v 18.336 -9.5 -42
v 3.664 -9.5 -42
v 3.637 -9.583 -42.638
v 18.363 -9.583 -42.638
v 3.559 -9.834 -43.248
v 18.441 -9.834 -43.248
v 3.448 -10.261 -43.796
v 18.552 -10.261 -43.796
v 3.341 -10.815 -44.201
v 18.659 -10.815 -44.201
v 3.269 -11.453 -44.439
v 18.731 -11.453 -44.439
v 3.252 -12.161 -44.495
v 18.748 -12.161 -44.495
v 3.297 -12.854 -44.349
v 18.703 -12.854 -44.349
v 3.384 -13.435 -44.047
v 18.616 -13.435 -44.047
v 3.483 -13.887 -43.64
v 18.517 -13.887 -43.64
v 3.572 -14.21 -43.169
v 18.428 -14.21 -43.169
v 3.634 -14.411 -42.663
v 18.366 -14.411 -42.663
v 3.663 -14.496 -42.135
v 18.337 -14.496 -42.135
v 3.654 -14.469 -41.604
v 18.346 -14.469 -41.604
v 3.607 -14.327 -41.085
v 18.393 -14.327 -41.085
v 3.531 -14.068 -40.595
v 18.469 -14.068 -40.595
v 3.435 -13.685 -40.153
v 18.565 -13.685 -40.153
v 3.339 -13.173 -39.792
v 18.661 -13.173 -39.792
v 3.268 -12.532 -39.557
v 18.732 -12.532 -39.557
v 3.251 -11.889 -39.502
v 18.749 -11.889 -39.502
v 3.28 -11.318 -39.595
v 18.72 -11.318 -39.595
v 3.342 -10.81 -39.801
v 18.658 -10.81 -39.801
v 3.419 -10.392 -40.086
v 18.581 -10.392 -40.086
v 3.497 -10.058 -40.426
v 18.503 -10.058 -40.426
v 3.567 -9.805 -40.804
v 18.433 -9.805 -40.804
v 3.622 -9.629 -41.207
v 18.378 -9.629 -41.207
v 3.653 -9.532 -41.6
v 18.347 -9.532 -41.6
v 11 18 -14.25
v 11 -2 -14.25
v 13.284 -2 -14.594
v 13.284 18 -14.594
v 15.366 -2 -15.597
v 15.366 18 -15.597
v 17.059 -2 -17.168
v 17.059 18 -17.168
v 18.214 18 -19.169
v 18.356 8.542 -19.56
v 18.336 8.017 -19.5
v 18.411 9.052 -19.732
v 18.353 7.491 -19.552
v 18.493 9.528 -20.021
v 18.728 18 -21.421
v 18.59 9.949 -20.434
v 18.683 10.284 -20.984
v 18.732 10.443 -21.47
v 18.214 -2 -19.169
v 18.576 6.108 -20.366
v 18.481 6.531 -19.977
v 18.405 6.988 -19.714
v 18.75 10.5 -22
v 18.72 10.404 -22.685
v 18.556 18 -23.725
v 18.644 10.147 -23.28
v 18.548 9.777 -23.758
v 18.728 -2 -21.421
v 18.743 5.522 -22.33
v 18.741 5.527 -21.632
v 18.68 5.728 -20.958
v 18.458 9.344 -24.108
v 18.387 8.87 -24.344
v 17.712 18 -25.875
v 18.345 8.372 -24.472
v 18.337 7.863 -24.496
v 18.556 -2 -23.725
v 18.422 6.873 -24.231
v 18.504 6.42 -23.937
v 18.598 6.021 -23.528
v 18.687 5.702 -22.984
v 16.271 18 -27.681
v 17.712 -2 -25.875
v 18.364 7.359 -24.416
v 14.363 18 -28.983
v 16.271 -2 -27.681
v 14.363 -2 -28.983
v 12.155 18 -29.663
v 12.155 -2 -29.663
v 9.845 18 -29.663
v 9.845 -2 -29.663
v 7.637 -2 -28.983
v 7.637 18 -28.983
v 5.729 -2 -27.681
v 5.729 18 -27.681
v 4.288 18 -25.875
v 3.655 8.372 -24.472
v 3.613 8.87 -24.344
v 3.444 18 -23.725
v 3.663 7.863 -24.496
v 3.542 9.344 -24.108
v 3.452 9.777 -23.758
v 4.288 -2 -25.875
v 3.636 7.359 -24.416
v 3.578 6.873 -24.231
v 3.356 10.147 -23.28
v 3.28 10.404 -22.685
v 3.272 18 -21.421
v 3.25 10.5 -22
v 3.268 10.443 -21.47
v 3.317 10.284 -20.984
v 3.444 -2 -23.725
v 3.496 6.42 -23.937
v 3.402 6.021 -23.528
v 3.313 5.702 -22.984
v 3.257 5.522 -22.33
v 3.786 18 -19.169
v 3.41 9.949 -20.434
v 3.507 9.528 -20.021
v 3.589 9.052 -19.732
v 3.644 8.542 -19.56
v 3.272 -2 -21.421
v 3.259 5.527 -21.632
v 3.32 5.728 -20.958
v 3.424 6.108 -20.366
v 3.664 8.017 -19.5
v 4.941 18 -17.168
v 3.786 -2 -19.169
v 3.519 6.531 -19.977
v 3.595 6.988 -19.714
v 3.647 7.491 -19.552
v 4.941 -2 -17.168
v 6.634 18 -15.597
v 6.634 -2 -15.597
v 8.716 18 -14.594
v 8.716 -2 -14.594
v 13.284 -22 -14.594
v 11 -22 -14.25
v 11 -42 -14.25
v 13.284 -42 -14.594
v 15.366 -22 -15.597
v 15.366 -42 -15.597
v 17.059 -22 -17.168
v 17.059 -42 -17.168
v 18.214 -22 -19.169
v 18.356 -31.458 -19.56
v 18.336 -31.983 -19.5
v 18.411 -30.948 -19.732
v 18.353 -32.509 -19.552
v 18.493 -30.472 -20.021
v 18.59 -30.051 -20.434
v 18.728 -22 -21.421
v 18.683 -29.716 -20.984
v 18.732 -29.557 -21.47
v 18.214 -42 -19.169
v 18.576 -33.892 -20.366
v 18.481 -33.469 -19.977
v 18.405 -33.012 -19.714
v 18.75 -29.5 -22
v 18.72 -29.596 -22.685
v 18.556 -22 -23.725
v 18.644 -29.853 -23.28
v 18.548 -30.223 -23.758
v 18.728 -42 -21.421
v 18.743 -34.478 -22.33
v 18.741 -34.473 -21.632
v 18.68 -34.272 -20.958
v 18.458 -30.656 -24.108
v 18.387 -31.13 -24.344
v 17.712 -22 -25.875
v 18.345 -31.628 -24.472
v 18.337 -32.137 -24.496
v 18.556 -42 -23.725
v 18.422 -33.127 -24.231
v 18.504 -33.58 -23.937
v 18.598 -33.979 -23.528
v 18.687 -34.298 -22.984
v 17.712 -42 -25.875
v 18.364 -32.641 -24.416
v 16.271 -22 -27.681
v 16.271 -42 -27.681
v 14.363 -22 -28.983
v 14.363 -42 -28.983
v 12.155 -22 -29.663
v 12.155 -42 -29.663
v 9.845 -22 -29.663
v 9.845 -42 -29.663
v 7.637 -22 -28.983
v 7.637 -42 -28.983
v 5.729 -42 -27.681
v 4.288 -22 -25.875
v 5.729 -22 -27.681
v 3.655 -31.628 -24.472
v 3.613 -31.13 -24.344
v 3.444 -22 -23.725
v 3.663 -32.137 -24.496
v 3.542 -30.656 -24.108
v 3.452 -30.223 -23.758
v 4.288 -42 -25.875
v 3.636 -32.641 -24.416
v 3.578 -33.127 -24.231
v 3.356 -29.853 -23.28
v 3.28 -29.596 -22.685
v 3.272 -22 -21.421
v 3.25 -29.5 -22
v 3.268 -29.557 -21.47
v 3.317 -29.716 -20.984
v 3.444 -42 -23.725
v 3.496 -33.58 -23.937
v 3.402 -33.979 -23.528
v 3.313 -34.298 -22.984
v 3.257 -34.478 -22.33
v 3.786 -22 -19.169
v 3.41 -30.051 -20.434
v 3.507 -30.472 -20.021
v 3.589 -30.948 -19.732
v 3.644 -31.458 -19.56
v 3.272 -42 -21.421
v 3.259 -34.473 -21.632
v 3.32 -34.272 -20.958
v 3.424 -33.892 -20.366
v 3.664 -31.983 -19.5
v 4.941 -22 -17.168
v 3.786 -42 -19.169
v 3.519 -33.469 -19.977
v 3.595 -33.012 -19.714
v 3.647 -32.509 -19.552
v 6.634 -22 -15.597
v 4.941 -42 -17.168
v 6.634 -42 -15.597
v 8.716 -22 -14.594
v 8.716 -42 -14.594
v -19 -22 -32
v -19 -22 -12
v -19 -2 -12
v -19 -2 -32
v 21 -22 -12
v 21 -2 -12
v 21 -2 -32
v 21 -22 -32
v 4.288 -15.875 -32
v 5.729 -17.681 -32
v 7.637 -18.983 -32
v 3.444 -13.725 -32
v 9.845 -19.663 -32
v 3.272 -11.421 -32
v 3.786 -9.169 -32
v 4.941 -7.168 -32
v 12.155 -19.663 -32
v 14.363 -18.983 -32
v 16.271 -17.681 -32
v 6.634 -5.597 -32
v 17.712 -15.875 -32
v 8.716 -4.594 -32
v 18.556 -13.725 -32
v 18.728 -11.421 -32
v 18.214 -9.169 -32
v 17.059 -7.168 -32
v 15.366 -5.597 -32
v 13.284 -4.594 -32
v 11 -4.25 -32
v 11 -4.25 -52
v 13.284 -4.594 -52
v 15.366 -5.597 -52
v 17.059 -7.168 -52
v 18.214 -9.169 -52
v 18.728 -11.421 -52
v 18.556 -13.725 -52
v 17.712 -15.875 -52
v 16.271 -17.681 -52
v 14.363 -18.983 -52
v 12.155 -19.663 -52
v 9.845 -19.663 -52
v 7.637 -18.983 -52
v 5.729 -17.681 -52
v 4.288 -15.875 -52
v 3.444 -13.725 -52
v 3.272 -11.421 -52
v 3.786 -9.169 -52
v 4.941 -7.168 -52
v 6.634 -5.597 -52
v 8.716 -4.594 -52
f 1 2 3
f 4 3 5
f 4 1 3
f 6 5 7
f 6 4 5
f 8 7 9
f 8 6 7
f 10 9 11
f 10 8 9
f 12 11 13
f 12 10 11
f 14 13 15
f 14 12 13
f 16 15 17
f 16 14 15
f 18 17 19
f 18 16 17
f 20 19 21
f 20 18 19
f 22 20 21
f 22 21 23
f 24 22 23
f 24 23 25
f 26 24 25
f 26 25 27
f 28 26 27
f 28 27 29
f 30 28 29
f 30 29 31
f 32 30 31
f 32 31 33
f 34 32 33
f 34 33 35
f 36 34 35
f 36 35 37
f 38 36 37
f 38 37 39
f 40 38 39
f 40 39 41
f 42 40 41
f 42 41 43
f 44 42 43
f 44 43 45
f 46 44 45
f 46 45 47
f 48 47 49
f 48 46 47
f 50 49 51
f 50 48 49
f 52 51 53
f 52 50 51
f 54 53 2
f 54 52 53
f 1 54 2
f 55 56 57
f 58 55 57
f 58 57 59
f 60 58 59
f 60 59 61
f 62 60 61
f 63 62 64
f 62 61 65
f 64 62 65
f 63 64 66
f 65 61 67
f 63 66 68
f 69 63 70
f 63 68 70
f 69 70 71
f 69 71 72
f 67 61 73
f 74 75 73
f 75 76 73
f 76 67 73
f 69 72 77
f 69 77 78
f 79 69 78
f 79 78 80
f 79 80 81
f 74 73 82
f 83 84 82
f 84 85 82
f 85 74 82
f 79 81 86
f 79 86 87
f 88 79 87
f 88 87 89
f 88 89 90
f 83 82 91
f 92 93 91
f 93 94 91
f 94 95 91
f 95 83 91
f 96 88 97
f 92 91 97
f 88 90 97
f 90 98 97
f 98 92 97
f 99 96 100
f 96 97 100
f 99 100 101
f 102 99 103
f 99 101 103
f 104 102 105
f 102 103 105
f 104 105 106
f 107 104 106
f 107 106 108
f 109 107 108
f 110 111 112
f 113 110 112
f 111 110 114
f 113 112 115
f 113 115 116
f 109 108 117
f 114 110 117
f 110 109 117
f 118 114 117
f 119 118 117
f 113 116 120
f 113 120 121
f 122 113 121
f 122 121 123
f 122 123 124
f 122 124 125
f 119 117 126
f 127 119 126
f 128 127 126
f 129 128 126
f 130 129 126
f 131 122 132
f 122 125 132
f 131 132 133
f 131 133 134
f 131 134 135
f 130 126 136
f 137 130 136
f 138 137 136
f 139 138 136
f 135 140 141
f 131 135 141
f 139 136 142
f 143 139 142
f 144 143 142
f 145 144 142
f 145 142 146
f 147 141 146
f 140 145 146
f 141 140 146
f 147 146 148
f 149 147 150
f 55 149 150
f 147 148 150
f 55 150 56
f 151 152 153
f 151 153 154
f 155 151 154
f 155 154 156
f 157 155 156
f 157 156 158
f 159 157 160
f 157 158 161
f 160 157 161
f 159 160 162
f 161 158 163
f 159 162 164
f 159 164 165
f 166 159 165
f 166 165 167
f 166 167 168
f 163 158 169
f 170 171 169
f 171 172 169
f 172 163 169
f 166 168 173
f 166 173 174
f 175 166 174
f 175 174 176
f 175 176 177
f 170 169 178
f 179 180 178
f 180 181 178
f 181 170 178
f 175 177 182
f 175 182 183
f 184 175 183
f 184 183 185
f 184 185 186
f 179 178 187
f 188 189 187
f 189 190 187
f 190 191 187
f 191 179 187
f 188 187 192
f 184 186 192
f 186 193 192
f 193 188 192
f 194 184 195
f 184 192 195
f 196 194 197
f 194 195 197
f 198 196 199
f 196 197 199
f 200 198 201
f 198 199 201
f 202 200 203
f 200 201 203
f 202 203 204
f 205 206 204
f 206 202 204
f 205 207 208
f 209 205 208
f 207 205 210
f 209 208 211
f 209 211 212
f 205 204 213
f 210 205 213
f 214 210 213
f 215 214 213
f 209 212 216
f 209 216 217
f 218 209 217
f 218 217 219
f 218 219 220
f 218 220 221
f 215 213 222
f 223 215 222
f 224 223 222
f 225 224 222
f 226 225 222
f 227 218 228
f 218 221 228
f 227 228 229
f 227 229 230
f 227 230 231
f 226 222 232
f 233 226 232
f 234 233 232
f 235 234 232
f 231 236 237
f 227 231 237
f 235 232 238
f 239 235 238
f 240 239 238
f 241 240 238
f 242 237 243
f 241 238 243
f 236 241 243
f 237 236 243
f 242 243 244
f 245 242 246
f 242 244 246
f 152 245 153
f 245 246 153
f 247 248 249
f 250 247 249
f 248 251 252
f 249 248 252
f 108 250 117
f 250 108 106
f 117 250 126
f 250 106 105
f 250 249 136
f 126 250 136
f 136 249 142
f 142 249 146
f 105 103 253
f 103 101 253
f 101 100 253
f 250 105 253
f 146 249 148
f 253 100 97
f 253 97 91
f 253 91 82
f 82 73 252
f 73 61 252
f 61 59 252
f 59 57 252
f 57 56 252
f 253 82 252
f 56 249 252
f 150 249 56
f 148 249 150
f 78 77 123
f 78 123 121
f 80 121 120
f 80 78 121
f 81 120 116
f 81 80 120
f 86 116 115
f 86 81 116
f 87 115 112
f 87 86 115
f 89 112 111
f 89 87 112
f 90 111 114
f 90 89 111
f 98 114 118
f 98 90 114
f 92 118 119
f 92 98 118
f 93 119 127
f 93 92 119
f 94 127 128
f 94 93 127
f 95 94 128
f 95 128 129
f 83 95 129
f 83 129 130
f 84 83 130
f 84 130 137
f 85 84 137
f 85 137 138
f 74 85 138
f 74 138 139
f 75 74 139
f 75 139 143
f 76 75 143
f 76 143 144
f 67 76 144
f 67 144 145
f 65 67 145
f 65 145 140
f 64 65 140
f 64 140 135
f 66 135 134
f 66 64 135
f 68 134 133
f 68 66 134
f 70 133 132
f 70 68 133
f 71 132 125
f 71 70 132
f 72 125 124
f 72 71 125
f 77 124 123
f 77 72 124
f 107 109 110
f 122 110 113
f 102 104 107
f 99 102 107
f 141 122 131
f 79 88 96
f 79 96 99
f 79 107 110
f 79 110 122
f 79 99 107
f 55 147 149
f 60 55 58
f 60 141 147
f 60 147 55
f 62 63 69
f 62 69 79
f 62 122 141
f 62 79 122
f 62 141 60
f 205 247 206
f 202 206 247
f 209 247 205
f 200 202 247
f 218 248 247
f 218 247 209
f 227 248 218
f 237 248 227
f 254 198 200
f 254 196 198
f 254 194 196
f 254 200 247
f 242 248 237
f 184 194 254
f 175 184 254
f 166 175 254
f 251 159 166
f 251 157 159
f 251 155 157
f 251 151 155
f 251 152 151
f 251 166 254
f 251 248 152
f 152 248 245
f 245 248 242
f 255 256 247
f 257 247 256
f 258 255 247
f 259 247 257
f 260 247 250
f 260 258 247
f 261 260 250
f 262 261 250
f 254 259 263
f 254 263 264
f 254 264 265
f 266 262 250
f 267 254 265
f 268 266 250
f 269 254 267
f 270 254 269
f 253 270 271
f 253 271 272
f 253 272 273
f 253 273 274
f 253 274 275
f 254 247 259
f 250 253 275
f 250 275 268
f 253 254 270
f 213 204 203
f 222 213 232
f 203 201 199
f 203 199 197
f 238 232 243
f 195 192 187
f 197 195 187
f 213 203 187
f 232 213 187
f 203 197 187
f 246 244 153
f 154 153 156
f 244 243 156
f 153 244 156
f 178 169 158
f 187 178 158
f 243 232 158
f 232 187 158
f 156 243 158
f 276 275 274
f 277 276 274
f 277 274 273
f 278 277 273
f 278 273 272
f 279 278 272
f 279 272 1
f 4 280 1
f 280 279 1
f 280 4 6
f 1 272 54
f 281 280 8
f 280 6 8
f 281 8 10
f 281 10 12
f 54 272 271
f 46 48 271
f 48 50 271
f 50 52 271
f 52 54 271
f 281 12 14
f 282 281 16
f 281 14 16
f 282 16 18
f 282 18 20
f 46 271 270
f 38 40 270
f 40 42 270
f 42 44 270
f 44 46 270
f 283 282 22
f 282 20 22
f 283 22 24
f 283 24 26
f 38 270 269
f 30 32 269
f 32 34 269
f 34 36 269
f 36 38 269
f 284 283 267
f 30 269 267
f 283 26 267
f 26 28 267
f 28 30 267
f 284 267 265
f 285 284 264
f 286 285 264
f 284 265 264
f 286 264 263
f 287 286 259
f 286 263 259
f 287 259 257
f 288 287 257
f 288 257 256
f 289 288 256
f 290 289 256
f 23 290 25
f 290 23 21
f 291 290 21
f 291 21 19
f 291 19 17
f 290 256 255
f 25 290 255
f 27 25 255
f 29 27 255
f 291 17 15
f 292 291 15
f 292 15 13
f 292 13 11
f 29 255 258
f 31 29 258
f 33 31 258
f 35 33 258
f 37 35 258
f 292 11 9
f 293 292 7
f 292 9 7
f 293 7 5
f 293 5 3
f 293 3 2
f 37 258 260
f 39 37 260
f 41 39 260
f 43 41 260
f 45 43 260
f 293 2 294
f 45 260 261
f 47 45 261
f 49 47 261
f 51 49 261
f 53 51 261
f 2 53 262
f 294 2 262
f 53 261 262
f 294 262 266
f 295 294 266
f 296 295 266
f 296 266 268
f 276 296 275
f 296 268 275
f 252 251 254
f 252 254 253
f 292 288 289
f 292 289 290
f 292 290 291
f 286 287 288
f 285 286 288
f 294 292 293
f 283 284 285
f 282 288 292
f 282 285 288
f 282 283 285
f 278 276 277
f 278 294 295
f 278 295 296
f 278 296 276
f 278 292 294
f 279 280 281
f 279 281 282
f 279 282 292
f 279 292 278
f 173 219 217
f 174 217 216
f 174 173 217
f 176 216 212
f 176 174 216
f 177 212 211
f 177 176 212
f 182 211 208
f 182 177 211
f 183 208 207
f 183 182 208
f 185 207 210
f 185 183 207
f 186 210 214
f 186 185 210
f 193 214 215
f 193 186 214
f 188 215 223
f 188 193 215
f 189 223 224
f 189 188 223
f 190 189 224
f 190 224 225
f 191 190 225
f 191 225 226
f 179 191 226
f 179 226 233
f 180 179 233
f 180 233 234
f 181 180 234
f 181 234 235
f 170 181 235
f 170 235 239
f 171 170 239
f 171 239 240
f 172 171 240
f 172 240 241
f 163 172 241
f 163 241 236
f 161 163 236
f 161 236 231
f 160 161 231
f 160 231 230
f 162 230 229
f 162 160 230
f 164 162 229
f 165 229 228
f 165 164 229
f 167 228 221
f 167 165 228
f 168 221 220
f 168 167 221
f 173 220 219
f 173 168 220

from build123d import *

# Parameters (mm, degrees)
CYLINDER017_R          = 2.5
CYLINDER017_DEPTH      = 30
CYLINDER018_R          = 2.5
CYLINDER018_DEPTH      = 30
CYLINDER019_R          = 2.5
CYLINDER019_DEPTH      = 30
CYLINDER016_R          = 7.75
CYLINDER016_DEPTH      = 30
CYLINDER015_R          = 7.75
CYLINDER015_DEPTH      = 60
BOX001_W               = 20
BOX001_H               = 40
BOX001_DEPTH           = 20
CUT001_ROLL_ANGLE      = 180
CUT001_PLACEMENT_ANGLE = 90


with BuildPart() as taladros003:
    # Cylinder017 → Cylinder017 (new body)
    with BuildSketch(Plane(origin=(20, 15, 0), x_dir=(1, 0, 0), z_dir=(0, -1, 0))):
        Circle(CYLINDER017_R)
    extrude(amount=CYLINDER017_DEPTH)


with BuildPart() as taladros004:
    # Cylinder018 → Cylinder018 (new body)
    with BuildSketch(Plane(origin=(-20, 15, 0), x_dir=(1, 0, 0), z_dir=(0, -1, 0))):
        Circle(CYLINDER018_R)
    extrude(amount=CYLINDER018_DEPTH)


with BuildPart() as taladros_ligamento_t001:
    # Cylinder019 → Cylinder019 (new body)
    with BuildSketch(Plane(origin=(0, 15, 20), x_dir=(1, 0, 0), z_dir=(0, -1, 0))):
        Circle(CYLINDER019_R)
    extrude(amount=CYLINDER019_DEPTH)

    # Fusion004: union Taladros003, Taladros004
    add(taladros003.part)
    add(taladros004.part)


with BuildPart() as ligamento_cadera003:
    # Cylinder016 → Cylinder016 (new body)
    with BuildSketch(Plane.XY):
        Circle(CYLINDER016_R)
    extrude(amount=CYLINDER016_DEPTH)


with BuildPart() as ligamento_cadera002:
    # Cylinder015 → Cylinder015 (new body)
    with BuildSketch(Plane(origin=(-30, 0, 0), x_dir=(0, 0, -1), z_dir=(1, 0, 0))):
        Circle(CYLINDER015_R)
    extrude(amount=CYLINDER015_DEPTH)


with BuildPart() as ligamento_t_imprimir001:
    # Box001 → Box001 (new body)
    with BuildSketch(Plane(origin=(-10, -30, -10), x_dir=(1, 0, 0), z_dir=(0, 0, 1))):
        with Locations((10, 20)):
            Rectangle(BOX001_W, BOX001_H)
    extrude(amount=BOX001_DEPTH)

    # Fusion003: union Ligamento_cadera003, Ligamento_cadera002
    add(ligamento_cadera003.part)
    add(ligamento_cadera002.part)

    # Cut001: cut Taladros_ligamento_T001
    add(taladros_ligamento_t001.part, mode=Mode.SUBTRACT)


with BuildPart() as ligamento_t_imprimir001_1:
    # Cut001 roll: moved
    add(ligamento_t_imprimir001.part.rotate(Axis((0, 0, 0), (1, 0, 0)), CUT001_ROLL_ANGLE))


with BuildPart() as ligamento_t_imprimir001_2:
    # Cut001 placement: moved
    add(ligamento_t_imprimir001_1.part.moved(Location((11, -12, -22))).rotate(Axis((11, -12, -22), (0, 0, 1)), CUT001_PLACEMENT_ANGLE))


solid = ligamento_t_imprimir001_2.part
